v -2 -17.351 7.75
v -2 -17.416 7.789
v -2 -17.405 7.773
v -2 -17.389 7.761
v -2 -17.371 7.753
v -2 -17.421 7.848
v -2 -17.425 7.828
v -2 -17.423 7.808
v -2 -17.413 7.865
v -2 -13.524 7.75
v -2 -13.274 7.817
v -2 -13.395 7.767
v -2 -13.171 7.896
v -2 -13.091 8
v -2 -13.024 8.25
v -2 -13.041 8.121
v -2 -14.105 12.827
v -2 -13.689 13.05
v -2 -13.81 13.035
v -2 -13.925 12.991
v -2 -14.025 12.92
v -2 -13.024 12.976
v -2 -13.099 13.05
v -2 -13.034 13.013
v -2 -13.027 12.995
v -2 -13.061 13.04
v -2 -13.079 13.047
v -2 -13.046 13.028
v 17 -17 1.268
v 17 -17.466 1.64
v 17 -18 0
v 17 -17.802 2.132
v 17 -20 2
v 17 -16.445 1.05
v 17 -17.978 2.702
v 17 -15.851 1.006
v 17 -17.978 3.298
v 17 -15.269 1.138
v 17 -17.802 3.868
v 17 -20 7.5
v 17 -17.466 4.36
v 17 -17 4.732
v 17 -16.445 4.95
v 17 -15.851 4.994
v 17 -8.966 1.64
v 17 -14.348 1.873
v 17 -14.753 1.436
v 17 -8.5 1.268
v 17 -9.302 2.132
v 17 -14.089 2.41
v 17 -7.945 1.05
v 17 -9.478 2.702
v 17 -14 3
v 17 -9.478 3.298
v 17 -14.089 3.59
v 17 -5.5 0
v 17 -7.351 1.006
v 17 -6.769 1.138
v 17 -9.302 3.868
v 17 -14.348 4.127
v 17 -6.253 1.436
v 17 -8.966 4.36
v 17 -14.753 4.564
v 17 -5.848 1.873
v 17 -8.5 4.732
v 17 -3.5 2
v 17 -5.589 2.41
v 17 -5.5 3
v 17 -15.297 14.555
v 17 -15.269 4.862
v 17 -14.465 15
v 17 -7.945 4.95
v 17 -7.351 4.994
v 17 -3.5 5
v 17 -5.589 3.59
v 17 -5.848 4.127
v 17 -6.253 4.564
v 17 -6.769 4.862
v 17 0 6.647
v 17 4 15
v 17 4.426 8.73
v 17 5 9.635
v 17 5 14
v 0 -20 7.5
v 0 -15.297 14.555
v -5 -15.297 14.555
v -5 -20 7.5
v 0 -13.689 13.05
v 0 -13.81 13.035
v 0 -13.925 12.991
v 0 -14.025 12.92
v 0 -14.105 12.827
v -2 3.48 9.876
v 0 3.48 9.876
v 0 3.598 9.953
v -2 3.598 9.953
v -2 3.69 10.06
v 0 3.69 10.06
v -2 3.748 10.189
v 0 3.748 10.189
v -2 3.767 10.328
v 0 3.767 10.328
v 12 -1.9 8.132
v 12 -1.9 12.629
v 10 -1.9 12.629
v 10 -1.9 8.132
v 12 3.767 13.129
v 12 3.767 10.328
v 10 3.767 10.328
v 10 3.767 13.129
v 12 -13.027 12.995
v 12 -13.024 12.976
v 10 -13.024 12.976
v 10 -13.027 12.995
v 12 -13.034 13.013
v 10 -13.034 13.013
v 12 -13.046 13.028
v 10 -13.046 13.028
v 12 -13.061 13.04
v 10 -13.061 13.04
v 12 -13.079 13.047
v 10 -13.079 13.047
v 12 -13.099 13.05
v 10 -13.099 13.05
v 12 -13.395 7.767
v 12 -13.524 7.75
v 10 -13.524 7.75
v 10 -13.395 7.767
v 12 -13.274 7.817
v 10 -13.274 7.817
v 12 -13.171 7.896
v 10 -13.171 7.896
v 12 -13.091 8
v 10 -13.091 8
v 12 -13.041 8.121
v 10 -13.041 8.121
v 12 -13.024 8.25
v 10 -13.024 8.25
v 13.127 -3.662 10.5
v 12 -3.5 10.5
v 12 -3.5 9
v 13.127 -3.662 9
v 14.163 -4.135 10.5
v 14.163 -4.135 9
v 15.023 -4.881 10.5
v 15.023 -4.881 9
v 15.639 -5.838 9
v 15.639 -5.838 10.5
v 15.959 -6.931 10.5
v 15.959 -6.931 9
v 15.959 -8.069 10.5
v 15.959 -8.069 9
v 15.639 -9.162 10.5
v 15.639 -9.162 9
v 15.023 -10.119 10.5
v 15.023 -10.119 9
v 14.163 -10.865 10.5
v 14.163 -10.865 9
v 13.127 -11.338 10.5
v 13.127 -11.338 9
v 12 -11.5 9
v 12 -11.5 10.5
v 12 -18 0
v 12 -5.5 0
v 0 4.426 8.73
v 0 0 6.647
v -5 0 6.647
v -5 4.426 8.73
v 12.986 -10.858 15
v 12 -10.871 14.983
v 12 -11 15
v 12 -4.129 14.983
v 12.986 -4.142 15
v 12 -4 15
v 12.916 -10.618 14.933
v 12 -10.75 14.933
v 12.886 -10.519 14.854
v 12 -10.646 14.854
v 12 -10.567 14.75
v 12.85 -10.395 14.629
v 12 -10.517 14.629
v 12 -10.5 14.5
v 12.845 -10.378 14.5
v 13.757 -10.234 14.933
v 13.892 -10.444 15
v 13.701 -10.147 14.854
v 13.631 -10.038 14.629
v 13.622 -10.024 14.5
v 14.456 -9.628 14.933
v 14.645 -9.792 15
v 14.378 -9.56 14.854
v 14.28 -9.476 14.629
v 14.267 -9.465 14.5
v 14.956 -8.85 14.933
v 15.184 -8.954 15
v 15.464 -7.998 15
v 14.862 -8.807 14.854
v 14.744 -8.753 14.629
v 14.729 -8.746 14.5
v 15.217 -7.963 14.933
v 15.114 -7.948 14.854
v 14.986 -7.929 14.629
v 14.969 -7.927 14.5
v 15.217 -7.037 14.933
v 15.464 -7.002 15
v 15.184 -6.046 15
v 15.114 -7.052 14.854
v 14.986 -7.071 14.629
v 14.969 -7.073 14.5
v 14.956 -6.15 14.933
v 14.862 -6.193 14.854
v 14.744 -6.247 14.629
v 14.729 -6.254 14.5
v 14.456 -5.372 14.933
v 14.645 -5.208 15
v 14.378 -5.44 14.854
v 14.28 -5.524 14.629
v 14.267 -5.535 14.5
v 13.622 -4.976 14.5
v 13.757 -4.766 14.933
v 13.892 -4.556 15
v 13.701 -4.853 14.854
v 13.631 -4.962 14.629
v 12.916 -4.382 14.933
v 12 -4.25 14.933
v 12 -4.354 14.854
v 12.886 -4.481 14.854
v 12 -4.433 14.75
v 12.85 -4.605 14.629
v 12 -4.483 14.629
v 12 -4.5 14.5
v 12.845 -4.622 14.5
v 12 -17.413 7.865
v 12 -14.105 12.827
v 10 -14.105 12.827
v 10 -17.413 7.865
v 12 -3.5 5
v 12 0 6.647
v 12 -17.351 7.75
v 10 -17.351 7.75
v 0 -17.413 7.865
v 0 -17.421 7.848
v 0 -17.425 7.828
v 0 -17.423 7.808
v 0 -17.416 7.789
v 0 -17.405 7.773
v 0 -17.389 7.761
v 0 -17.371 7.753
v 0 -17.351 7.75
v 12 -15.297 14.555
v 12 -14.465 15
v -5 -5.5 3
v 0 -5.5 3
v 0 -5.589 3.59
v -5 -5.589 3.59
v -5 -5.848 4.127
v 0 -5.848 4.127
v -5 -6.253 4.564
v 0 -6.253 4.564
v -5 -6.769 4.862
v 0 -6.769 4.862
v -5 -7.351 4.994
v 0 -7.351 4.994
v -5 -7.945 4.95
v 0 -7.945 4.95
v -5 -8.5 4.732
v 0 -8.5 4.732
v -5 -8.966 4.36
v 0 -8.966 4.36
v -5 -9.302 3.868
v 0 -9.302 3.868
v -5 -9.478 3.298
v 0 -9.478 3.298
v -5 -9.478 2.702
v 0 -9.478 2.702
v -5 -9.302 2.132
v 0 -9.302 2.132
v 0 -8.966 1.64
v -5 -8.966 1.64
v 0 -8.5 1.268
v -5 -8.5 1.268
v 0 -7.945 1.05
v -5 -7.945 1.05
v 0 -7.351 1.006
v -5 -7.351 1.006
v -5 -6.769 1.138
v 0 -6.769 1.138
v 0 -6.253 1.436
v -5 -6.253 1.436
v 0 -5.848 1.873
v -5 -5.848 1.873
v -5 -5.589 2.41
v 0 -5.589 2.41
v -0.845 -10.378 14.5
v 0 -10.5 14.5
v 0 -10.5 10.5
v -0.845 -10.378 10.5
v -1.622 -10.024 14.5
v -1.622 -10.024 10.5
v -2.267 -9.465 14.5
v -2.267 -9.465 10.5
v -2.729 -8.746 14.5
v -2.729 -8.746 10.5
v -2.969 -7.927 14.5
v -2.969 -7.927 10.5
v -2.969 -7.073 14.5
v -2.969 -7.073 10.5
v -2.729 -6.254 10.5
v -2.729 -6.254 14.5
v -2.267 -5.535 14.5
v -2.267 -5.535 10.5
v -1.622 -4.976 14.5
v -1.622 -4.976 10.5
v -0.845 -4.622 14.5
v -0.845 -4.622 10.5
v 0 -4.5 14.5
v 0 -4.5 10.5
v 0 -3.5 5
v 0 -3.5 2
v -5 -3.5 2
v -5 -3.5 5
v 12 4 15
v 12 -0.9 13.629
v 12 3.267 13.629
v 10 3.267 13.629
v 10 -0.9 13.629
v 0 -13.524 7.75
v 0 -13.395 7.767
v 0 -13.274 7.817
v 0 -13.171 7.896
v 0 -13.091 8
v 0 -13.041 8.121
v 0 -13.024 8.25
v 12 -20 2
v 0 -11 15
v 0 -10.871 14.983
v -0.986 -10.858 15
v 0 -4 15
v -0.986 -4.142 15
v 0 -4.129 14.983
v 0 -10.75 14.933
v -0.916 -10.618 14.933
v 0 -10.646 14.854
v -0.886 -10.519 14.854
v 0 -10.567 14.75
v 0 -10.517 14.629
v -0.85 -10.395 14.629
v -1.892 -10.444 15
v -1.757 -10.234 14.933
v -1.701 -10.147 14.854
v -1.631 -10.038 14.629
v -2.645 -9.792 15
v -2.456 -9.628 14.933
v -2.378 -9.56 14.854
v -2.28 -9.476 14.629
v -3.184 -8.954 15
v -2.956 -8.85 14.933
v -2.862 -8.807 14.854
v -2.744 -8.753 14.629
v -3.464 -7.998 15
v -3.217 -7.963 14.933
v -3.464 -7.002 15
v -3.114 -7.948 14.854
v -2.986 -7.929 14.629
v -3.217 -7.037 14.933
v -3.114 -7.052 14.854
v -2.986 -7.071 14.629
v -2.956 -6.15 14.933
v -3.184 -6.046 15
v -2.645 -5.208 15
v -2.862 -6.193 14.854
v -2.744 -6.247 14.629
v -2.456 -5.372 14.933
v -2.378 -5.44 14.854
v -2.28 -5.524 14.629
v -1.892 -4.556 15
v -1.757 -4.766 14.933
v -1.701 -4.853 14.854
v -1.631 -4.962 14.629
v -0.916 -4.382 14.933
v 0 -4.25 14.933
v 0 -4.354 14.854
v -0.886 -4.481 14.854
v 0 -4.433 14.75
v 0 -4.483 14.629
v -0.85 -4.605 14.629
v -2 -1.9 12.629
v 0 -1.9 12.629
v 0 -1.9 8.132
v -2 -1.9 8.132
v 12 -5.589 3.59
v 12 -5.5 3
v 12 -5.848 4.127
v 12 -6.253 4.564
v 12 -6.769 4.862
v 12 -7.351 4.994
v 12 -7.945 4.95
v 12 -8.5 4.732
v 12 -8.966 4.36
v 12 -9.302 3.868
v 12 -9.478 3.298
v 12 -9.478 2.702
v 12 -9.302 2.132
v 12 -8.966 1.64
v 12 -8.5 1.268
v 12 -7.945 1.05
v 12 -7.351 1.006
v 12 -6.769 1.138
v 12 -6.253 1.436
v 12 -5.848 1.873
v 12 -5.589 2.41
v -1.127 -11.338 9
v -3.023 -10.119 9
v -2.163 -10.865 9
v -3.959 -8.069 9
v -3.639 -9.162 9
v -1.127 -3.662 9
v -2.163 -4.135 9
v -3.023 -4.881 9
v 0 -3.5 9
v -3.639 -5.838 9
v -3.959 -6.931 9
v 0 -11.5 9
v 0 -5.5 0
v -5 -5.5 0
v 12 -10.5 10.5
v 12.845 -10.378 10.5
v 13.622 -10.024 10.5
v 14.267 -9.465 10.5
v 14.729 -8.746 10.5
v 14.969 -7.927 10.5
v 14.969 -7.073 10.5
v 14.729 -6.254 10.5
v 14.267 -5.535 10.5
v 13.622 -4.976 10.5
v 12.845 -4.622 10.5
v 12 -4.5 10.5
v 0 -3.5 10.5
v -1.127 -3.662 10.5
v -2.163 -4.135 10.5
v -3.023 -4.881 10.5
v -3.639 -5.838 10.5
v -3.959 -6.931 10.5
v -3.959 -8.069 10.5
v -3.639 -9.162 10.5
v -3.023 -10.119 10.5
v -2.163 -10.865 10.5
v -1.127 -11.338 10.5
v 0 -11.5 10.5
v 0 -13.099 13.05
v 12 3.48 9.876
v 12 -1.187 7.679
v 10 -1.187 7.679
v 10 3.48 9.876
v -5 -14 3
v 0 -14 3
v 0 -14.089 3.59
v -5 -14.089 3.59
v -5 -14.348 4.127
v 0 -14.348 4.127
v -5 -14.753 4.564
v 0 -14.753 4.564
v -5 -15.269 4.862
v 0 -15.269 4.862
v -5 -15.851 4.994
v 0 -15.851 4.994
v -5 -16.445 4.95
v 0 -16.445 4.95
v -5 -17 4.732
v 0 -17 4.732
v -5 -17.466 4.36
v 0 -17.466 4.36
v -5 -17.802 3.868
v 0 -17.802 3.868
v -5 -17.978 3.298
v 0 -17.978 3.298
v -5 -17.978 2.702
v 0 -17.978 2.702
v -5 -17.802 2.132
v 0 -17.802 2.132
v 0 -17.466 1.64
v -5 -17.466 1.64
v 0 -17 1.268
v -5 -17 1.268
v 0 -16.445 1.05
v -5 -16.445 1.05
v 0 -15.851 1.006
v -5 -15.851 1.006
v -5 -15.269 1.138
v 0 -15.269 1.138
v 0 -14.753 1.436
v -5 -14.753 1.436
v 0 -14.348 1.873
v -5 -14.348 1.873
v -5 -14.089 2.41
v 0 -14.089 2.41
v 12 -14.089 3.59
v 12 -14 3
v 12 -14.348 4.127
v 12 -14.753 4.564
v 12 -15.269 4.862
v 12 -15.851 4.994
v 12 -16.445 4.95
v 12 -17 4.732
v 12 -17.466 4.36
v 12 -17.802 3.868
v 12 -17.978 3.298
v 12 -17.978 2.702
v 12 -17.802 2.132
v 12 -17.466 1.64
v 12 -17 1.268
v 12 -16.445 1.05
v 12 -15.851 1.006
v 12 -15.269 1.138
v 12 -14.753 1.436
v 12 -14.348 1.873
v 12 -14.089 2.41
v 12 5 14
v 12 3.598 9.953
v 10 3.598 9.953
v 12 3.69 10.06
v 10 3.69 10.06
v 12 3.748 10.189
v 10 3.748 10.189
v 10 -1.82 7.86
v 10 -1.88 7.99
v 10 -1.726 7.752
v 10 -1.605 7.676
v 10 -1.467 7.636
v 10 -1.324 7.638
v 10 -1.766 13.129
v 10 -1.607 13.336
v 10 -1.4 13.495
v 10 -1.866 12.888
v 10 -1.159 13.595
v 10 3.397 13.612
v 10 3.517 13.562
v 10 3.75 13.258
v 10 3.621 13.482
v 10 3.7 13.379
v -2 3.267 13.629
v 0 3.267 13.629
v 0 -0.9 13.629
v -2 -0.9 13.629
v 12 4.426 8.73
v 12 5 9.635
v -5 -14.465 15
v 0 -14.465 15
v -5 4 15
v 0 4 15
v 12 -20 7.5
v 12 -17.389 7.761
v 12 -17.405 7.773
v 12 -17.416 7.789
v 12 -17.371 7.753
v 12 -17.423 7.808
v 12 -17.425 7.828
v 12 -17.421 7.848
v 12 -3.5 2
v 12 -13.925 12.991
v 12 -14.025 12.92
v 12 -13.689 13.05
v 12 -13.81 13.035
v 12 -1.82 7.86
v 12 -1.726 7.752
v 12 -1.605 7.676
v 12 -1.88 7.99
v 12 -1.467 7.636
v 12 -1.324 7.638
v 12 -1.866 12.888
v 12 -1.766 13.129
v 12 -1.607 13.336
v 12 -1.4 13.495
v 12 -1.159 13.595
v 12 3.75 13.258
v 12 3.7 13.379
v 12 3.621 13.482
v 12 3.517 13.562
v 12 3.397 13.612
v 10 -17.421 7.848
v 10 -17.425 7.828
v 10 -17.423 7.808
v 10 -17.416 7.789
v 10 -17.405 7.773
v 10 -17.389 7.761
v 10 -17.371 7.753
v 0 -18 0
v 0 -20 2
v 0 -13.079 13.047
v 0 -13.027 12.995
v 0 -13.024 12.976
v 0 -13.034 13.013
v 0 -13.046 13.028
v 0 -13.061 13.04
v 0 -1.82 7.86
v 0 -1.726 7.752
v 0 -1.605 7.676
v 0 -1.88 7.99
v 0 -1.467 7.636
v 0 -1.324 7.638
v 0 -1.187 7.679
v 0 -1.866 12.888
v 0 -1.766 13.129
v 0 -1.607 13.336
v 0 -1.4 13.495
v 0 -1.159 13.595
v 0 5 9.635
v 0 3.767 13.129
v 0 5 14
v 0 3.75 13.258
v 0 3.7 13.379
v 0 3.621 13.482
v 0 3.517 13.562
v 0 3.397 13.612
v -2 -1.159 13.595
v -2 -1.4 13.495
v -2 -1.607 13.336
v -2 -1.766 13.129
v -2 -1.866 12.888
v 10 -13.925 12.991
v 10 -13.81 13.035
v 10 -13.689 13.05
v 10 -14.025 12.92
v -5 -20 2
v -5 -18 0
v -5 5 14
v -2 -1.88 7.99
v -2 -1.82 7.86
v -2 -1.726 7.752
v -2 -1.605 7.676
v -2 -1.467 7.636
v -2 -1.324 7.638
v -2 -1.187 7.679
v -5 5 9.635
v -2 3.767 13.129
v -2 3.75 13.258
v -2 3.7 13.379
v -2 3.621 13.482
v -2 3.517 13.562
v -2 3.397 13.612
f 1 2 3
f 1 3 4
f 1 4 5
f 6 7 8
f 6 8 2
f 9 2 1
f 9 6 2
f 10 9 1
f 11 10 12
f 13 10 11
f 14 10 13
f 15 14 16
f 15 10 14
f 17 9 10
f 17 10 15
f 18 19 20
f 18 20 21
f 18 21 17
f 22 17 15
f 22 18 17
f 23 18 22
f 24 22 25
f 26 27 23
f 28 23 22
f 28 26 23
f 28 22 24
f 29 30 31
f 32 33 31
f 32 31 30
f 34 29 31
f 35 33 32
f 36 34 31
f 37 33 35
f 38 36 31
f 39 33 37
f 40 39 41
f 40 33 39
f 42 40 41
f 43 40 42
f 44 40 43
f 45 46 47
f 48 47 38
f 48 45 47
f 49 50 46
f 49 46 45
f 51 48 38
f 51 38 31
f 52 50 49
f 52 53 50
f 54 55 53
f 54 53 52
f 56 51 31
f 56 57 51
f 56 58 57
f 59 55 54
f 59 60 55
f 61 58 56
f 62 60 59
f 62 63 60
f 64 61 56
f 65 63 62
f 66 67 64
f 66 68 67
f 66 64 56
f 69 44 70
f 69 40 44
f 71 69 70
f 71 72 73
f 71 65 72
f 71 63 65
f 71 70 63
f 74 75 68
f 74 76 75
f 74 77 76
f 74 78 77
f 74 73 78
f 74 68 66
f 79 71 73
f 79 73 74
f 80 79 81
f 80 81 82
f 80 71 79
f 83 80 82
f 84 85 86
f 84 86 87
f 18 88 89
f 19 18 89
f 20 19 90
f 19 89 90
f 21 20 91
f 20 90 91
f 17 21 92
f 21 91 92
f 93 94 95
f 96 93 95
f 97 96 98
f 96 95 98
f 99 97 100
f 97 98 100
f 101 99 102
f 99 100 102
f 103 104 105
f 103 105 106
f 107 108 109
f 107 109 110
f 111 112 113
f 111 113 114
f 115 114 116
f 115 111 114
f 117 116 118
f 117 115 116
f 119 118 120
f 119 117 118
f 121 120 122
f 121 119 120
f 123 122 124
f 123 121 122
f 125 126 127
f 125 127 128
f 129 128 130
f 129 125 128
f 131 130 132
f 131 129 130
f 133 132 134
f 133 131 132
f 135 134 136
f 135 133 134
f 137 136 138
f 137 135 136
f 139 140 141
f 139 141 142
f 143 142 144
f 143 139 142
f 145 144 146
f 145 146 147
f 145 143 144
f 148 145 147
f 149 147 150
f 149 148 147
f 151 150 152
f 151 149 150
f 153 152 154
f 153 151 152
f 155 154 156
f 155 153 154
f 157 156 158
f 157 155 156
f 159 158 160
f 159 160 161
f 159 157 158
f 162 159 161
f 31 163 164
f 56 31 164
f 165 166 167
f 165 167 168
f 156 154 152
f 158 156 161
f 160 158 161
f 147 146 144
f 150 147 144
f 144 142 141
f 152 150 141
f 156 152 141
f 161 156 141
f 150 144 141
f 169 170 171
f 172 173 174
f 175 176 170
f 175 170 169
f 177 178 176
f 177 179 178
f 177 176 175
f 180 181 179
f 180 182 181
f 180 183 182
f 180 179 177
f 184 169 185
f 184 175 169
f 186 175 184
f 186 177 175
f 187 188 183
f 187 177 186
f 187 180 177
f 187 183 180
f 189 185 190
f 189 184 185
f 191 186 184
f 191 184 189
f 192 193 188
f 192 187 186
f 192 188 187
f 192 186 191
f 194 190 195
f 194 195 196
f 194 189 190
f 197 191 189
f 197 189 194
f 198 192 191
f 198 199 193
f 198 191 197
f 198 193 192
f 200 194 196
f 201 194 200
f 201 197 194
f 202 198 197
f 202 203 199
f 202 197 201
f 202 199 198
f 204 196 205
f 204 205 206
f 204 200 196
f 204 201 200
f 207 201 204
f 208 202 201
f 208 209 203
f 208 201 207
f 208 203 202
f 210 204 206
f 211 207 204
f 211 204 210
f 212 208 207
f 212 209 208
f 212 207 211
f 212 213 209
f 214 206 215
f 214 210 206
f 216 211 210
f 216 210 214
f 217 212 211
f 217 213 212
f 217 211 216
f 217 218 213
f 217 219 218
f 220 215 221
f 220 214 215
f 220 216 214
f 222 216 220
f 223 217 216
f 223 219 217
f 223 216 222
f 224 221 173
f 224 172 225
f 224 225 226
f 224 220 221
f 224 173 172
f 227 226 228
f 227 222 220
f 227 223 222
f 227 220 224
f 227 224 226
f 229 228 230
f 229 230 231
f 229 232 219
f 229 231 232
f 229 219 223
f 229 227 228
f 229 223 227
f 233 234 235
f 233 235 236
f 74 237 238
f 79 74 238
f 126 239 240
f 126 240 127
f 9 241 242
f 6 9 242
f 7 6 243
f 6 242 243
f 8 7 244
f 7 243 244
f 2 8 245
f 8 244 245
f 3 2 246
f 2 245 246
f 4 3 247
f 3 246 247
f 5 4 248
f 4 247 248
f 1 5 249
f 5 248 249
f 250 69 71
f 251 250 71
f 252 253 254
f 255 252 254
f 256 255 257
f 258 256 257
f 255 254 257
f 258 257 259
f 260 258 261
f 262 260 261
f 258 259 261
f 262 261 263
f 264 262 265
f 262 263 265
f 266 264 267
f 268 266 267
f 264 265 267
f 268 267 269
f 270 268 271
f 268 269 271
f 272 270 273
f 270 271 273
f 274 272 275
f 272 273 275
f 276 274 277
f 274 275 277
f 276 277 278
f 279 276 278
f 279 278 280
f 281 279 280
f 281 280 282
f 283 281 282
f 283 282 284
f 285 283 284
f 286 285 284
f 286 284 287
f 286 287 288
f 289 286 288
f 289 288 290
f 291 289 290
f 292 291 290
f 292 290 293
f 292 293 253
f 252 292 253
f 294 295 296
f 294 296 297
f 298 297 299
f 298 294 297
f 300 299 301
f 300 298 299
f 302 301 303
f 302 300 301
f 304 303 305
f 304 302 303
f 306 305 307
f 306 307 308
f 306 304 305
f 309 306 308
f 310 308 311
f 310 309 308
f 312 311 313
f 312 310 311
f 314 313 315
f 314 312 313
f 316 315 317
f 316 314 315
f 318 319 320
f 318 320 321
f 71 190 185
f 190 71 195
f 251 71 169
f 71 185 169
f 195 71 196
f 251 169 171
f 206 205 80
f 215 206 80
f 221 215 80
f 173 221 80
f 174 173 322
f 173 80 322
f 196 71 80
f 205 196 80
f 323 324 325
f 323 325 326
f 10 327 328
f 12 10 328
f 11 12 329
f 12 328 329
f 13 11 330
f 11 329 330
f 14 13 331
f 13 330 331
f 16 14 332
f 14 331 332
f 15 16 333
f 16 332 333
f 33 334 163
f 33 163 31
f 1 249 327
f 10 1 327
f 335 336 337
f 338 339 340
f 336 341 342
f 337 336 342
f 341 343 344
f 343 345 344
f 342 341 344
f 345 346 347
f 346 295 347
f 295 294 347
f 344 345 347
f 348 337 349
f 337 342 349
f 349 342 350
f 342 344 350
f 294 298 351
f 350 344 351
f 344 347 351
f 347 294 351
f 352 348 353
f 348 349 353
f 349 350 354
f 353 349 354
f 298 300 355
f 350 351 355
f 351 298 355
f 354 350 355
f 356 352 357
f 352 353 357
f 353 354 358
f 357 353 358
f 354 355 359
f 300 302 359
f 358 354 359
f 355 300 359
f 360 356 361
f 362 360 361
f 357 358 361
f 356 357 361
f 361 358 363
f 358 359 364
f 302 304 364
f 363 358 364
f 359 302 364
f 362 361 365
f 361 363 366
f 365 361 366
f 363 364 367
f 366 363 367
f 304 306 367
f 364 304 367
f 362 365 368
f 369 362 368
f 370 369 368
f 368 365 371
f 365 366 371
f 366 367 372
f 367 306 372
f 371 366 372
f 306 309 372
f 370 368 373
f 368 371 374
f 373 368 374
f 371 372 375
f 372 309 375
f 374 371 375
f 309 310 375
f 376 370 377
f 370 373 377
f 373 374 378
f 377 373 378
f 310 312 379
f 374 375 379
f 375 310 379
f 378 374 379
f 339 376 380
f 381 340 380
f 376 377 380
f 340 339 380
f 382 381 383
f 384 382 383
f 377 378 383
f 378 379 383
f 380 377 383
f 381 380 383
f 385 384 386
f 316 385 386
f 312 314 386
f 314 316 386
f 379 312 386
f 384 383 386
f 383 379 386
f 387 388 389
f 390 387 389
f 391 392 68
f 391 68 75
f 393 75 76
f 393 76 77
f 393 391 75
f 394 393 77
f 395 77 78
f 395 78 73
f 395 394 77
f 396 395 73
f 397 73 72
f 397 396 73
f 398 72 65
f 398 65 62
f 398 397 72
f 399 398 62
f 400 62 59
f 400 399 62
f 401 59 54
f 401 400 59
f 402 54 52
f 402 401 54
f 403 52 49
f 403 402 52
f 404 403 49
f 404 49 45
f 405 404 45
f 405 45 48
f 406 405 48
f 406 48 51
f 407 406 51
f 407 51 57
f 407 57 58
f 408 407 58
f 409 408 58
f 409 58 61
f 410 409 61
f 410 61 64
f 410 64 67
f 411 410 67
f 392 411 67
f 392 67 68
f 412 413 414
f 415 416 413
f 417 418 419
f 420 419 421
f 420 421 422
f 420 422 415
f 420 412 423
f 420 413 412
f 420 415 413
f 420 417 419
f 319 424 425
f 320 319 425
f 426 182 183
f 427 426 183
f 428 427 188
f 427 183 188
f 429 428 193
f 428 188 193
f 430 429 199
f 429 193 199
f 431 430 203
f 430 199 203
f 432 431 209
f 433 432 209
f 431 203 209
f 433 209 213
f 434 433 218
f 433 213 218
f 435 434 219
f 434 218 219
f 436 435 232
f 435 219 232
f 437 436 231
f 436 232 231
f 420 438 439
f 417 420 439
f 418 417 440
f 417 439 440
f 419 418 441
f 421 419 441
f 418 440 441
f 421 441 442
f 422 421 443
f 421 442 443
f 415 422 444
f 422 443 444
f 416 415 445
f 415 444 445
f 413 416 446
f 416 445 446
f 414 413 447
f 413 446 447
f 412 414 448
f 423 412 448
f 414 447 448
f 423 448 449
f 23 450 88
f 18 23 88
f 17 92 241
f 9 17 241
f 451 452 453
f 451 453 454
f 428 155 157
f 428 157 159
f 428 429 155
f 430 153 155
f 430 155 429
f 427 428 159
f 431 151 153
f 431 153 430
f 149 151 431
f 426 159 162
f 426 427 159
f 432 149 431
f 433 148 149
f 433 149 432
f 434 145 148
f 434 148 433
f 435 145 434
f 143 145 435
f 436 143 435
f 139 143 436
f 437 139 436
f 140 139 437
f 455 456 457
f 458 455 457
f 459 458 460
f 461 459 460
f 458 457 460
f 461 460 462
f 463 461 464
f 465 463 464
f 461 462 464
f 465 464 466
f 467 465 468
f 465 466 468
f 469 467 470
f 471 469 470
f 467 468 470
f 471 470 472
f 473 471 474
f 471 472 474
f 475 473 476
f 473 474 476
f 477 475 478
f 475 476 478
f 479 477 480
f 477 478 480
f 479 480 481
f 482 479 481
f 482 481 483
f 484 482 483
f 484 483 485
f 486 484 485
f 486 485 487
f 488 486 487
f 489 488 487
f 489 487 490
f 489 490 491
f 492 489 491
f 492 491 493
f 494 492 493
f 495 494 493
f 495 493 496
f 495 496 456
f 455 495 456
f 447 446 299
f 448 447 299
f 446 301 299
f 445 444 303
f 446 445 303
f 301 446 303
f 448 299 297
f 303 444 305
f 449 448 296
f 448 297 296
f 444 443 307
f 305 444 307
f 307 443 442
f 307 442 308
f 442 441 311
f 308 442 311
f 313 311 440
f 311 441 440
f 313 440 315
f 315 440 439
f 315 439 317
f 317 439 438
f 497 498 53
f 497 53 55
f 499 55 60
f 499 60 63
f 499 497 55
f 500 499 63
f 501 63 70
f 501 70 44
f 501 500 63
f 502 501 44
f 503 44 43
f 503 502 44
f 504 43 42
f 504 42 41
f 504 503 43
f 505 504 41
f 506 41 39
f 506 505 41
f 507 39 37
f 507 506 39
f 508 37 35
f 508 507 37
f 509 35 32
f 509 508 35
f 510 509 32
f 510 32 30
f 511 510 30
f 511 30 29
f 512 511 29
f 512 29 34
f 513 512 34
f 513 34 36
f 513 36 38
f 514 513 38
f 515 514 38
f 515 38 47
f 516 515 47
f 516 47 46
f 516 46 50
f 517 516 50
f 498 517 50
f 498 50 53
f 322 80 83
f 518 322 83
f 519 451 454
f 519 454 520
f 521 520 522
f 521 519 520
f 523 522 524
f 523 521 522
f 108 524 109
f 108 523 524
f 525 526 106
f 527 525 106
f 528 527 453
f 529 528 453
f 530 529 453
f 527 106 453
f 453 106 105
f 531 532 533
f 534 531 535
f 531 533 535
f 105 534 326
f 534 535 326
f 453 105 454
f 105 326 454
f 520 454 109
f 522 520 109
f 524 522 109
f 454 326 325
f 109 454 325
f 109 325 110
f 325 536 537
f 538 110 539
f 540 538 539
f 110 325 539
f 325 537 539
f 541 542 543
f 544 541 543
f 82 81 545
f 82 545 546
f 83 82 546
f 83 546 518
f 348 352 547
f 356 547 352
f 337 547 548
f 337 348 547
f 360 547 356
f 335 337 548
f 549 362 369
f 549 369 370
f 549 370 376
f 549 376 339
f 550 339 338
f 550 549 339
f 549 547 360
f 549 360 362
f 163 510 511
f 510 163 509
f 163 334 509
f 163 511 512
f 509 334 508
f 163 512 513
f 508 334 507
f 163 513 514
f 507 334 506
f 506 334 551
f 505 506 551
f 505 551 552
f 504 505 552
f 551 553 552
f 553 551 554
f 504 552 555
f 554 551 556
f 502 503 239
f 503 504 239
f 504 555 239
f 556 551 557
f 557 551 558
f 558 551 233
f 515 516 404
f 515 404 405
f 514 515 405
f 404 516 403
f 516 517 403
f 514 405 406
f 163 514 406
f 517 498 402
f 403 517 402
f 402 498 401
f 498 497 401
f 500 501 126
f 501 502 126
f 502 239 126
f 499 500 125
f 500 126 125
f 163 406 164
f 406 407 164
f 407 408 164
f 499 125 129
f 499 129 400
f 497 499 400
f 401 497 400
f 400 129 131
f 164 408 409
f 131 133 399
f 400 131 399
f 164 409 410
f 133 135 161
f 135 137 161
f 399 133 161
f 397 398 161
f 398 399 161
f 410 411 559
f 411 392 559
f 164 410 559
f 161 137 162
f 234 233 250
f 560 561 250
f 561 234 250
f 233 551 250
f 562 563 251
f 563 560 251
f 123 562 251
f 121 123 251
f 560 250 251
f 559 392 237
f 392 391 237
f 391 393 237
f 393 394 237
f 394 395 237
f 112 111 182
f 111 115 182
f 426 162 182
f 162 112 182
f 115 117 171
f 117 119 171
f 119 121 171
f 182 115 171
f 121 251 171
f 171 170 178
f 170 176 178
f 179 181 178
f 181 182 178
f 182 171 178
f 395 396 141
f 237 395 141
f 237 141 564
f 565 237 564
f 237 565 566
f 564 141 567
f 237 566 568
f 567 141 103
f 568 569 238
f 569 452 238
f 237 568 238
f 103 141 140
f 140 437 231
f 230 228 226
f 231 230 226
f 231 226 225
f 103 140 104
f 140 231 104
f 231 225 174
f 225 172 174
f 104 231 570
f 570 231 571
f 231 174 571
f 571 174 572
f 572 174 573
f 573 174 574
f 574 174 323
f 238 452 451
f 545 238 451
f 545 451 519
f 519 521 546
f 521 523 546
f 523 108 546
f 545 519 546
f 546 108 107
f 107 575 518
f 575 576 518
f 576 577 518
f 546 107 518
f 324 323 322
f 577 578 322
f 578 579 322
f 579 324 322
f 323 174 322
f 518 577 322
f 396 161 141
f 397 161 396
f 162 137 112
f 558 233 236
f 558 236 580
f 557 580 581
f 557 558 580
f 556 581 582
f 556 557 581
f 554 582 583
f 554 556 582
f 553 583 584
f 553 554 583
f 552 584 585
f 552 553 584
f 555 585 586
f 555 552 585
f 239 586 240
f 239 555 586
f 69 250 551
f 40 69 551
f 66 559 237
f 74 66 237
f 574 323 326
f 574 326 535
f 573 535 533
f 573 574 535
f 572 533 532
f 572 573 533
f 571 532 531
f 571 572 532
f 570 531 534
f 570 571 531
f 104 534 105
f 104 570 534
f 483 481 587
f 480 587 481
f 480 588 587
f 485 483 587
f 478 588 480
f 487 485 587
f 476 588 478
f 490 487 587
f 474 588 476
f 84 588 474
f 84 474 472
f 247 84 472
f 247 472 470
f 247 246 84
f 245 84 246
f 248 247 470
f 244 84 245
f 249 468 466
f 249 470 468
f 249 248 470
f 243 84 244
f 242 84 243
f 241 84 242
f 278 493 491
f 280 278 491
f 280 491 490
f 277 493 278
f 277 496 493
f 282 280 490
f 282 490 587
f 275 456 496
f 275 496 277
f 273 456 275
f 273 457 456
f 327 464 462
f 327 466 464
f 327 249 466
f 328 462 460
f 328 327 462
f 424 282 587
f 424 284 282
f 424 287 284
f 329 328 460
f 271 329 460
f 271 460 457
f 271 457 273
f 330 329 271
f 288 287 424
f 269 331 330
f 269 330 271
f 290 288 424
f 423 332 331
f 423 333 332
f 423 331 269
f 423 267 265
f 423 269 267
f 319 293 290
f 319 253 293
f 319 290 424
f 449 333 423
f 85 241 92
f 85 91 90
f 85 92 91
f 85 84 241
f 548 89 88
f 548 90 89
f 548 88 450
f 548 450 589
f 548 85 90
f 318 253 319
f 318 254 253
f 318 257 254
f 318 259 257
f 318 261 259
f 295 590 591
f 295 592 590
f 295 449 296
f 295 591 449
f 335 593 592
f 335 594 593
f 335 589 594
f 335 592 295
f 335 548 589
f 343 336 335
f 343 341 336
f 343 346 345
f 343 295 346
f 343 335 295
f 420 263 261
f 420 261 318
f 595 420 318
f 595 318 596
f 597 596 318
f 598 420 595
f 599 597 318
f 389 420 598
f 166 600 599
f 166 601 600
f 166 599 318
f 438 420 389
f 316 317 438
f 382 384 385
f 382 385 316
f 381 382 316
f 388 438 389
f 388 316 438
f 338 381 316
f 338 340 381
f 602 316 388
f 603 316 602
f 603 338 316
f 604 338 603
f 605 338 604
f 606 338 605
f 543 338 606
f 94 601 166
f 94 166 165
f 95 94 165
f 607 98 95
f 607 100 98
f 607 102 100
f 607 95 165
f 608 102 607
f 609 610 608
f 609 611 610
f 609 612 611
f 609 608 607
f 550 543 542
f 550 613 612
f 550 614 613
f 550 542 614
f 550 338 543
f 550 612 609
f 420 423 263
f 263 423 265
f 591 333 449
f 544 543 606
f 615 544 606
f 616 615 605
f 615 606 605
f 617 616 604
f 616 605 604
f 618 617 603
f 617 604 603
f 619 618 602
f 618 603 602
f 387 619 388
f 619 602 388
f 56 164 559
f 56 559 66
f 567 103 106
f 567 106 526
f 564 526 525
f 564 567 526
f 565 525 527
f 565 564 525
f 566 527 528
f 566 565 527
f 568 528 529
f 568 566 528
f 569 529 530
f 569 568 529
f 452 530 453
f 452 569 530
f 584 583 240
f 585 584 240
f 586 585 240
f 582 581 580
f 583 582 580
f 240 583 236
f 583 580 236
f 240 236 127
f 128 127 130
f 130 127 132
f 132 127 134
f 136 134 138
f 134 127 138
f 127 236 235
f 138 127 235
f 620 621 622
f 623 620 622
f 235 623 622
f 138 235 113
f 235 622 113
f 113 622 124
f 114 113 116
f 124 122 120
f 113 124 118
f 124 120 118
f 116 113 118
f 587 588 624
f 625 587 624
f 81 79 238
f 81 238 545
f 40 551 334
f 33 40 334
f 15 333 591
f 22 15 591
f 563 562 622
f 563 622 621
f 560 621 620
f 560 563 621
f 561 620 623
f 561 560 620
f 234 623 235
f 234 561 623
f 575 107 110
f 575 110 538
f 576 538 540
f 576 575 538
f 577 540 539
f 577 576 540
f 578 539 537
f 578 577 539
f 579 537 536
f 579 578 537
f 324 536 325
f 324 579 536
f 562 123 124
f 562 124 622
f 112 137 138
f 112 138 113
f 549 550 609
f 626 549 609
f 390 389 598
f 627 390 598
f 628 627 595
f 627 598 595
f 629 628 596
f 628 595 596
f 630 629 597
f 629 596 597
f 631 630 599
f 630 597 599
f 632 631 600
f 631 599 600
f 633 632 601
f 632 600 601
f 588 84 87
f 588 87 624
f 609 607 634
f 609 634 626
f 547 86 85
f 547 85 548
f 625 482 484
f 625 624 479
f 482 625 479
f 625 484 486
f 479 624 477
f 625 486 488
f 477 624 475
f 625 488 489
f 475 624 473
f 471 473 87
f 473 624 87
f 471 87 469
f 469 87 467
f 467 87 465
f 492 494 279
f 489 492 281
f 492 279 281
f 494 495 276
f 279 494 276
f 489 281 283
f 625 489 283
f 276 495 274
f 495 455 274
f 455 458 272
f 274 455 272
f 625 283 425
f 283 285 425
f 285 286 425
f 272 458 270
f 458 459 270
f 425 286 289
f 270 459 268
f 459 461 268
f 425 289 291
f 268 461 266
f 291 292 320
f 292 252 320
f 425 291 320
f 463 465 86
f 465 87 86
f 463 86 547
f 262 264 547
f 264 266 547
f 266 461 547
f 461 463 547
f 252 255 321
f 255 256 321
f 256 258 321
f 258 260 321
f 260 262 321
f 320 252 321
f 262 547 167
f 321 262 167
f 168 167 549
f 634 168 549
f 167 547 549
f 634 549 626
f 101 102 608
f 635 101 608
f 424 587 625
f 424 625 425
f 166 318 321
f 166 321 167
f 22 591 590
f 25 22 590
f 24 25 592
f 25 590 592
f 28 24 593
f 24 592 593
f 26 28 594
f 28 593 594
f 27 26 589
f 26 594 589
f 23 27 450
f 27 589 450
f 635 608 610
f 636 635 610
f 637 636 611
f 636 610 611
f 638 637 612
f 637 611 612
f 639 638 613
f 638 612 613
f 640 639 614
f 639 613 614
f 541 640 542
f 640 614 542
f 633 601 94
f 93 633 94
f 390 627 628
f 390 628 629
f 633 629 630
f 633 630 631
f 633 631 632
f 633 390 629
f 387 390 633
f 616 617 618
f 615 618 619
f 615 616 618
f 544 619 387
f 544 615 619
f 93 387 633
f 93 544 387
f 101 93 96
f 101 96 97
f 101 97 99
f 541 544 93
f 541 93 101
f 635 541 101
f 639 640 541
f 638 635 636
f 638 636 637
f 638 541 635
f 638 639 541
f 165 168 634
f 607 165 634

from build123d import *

# Parameters (mm, degrees)
F1_DEPTH     = 5
F3_DEPTH     = 6
F4_DEPTH     = 4.5
F5_R         = 0.5
F7_DEPTH     = 2
F6_R         = 2
F8_DEPTH     = 25
F9_SIZE      = 2
F10_T1_DEPTH = 10.1433659759
F10_T3_DEPTH = 8.3436121046
F10_T5_DEPTH = 7.853814506
F15_DEPTH    = 4


# Not quite as in the source:
# - a fillet or chamfer that OpenCascade refuses, or shapes differently, is made with other operations: its cross-section is extruded or revolved along the edge and cut away or added


with BuildPart() as f1:
    # F0 (on Right) → F1 (new body)
    with BuildSketch(Plane.YZ):
        Polygon((0, 6.6470588235), (0, 15), (-15, 15), (-20, 7.5), (-20, 0), (-15, 0), (-3.5, 0), (-3.5, 5), align=None)
        Polygon((5, 15), (0, 15), (0, 6.6470588235), (5, 9), align=None)
    extrude(amount=-F1_DEPTH)

    # F2 (on face) → F3 (cut)
    with BuildSketch(Plane.XY.offset(15)):
        with BuildLine():
            Line((0, -4.5), (0, -3.5))
            ThreePointArc((0, -3.5), (-4, -7.5), (0, -11.5))
            Line((0, -11.5), (0, -10.5))
            ThreePointArc((0, -10.5), (-3, -7.5), (0, -4.5))
        make_face()
        with BuildLine():
            Line((0, -10.5), (0, -4.5))
            ThreePointArc((0, -4.5), (-3, -7.5), (0, -10.5))
        make_face()
    extrude(amount=-F3_DEPTH, mode=Mode.SUBTRACT)

    # F2 (on face) → F4 (join)
    with BuildSketch(Plane.XY.offset(15)):
        with BuildLine():
            Line((0, -4.5), (0, -3.5))
            ThreePointArc((0, -3.5), (-4, -7.5), (0, -11.5))
            Line((0, -11.5), (0, -10.5))
            ThreePointArc((0, -10.5), (-3, -7.5), (0, -4.5))
        make_face()
    extrude(amount=-F4_DEPTH)

    # F5
    f5_edges = [f1.edges().sort_by_distance(p)[0] for p in [
        (-3, -7.5, 15),
    ]]
    fillet(f5_edges, radius=F5_R)

    # F6 (on face) → F7 (cut)
    with BuildSketch(Plane.YZ):
        with BuildLine():
            ThreePointArc((-13.5242807064, 7.7500004351), (-13.1707273158, 7.8964470445), (-13.0242807064, 8.2500004351))
            Line((-13.0242807064, 8.2500004351), (-13.0242807064, 12.9757192936))
            ThreePointArc((-13.0242807064, 12.9757192936), (-13.0460368942, 13.0282433771), (-13.0985609777, 13.0499995649))
            Line((-13.0985609777, 13.0499995649), (-13.6887995588, 13.0499995649))
            ThreePointArc((-13.6887995588, 13.0499995649), (-13.9247285216, 12.9908368643), (-14.104824706, 12.827349663))
            Line((-14.104824706, 12.827349663), (-17.4127351563, 7.8654839875))
            ThreePointArc((-17.4127351563, 7.8654839875), (-17.4164212631, 7.7892309717), (-17.3509302347, 7.7500004351))
            Line((-17.3509302347, 7.7500004351), (-13.5242807064, 7.7500004351))
        make_face()
        with BuildLine():
            Line((3.7674111893, 10.3282596764), (3.7674111893, 13.1287492136))
            ThreePointArc((3.7674111893, 13.1287492136), (3.6209645799, 13.4823026042), (3.2674111893, 13.6287492136))
            Line((3.2674111893, 13.6287492136), (-0.9, 13.6287492136))
            ThreePointArc((-0.9, 13.6287492136), (-1.6071067812, 13.3358559948), (-1.9, 12.6287492136))
            Line((-1.9, 12.6287492136), (-1.9, 8.1318308814))
            ThreePointArc((-1.9, 8.1318308814), (-1.6679092579, 7.7096642916), (-1.1871014818, 7.6794215303))
            Line((-1.1871014818, 7.6794215303), (3.4803097074, 9.8758503253))
            ThreePointArc((3.4803097074, 9.8758503253), (3.6895777791, 10.0603504185), (3.7674111893, 10.3282596764))
        make_face()
    extrude(amount=-F7_DEPTH, mode=Mode.SUBTRACT)

    # F6 (on face) → F8 (cut)
    with BuildSketch(Plane.YZ):
        with Locations((-16, 3)):
            Circle(F6_R)
        with Locations((-7.5, 3)):
            Circle(F6_R)
    extrude(amount=-F8_DEPTH, mode=Mode.SUBTRACT)

    # F9
    f9_edges = [f1.edges().sort_by_distance(p)[0] for p in [
        (-2.5, -20, 0),
        (-2.5, -3.5, 0),
    ]]
    chamfer(f9_edges, length=F9_SIZE)

    # F10: chamfer of 1 on 3 edges, made by hand

    # F10_s2 → F10_t1 (cut)
    with BuildSketch(Plane.YZ.offset(-7.571682988)):
        Polygon((4, 15), (5, 14), (5, 15), align=None)
    extrude(amount=F10_T1_DEPTH, mode=Mode.SUBTRACT)

    # F10_s4 → F10_t3 (cut)
    with BuildSketch(Plane.YZ.offset(-6.6718060523)):
        Polygon((4.4257970363, 8.7297868406), (5, 9.6346055428), (5, 9), align=None)
    extrude(amount=F10_T3_DEPTH, mode=Mode.SUBTRACT)

    # F10_s6 → F10_t5 (cut)
    with BuildSketch(Plane.YZ.offset(-6.426907253)):
        Polygon((-15.2968665358, 14.5547001962), (-14.4648162415, 15), (-15, 15), align=None)
    extrude(amount=F10_T5_DEPTH, mode=Mode.SUBTRACT)


with BuildPart() as f14_1:
    # F14: instance of F1
    add(f1.part.mirror(Plane.YZ.offset(6)))

    # F15 (add): faces of the model
    f15_faces = [f14_1.faces().sort_by_distance(p)[0] for p in [
        (14, 0.7023595879, 11.0891845918),
        (14, -14.5715468985, 9.8270536303),
    ]]
    extrude(f15_faces, amount=F15_DEPTH)


solid = Compound([f1.part, f14_1.part])
